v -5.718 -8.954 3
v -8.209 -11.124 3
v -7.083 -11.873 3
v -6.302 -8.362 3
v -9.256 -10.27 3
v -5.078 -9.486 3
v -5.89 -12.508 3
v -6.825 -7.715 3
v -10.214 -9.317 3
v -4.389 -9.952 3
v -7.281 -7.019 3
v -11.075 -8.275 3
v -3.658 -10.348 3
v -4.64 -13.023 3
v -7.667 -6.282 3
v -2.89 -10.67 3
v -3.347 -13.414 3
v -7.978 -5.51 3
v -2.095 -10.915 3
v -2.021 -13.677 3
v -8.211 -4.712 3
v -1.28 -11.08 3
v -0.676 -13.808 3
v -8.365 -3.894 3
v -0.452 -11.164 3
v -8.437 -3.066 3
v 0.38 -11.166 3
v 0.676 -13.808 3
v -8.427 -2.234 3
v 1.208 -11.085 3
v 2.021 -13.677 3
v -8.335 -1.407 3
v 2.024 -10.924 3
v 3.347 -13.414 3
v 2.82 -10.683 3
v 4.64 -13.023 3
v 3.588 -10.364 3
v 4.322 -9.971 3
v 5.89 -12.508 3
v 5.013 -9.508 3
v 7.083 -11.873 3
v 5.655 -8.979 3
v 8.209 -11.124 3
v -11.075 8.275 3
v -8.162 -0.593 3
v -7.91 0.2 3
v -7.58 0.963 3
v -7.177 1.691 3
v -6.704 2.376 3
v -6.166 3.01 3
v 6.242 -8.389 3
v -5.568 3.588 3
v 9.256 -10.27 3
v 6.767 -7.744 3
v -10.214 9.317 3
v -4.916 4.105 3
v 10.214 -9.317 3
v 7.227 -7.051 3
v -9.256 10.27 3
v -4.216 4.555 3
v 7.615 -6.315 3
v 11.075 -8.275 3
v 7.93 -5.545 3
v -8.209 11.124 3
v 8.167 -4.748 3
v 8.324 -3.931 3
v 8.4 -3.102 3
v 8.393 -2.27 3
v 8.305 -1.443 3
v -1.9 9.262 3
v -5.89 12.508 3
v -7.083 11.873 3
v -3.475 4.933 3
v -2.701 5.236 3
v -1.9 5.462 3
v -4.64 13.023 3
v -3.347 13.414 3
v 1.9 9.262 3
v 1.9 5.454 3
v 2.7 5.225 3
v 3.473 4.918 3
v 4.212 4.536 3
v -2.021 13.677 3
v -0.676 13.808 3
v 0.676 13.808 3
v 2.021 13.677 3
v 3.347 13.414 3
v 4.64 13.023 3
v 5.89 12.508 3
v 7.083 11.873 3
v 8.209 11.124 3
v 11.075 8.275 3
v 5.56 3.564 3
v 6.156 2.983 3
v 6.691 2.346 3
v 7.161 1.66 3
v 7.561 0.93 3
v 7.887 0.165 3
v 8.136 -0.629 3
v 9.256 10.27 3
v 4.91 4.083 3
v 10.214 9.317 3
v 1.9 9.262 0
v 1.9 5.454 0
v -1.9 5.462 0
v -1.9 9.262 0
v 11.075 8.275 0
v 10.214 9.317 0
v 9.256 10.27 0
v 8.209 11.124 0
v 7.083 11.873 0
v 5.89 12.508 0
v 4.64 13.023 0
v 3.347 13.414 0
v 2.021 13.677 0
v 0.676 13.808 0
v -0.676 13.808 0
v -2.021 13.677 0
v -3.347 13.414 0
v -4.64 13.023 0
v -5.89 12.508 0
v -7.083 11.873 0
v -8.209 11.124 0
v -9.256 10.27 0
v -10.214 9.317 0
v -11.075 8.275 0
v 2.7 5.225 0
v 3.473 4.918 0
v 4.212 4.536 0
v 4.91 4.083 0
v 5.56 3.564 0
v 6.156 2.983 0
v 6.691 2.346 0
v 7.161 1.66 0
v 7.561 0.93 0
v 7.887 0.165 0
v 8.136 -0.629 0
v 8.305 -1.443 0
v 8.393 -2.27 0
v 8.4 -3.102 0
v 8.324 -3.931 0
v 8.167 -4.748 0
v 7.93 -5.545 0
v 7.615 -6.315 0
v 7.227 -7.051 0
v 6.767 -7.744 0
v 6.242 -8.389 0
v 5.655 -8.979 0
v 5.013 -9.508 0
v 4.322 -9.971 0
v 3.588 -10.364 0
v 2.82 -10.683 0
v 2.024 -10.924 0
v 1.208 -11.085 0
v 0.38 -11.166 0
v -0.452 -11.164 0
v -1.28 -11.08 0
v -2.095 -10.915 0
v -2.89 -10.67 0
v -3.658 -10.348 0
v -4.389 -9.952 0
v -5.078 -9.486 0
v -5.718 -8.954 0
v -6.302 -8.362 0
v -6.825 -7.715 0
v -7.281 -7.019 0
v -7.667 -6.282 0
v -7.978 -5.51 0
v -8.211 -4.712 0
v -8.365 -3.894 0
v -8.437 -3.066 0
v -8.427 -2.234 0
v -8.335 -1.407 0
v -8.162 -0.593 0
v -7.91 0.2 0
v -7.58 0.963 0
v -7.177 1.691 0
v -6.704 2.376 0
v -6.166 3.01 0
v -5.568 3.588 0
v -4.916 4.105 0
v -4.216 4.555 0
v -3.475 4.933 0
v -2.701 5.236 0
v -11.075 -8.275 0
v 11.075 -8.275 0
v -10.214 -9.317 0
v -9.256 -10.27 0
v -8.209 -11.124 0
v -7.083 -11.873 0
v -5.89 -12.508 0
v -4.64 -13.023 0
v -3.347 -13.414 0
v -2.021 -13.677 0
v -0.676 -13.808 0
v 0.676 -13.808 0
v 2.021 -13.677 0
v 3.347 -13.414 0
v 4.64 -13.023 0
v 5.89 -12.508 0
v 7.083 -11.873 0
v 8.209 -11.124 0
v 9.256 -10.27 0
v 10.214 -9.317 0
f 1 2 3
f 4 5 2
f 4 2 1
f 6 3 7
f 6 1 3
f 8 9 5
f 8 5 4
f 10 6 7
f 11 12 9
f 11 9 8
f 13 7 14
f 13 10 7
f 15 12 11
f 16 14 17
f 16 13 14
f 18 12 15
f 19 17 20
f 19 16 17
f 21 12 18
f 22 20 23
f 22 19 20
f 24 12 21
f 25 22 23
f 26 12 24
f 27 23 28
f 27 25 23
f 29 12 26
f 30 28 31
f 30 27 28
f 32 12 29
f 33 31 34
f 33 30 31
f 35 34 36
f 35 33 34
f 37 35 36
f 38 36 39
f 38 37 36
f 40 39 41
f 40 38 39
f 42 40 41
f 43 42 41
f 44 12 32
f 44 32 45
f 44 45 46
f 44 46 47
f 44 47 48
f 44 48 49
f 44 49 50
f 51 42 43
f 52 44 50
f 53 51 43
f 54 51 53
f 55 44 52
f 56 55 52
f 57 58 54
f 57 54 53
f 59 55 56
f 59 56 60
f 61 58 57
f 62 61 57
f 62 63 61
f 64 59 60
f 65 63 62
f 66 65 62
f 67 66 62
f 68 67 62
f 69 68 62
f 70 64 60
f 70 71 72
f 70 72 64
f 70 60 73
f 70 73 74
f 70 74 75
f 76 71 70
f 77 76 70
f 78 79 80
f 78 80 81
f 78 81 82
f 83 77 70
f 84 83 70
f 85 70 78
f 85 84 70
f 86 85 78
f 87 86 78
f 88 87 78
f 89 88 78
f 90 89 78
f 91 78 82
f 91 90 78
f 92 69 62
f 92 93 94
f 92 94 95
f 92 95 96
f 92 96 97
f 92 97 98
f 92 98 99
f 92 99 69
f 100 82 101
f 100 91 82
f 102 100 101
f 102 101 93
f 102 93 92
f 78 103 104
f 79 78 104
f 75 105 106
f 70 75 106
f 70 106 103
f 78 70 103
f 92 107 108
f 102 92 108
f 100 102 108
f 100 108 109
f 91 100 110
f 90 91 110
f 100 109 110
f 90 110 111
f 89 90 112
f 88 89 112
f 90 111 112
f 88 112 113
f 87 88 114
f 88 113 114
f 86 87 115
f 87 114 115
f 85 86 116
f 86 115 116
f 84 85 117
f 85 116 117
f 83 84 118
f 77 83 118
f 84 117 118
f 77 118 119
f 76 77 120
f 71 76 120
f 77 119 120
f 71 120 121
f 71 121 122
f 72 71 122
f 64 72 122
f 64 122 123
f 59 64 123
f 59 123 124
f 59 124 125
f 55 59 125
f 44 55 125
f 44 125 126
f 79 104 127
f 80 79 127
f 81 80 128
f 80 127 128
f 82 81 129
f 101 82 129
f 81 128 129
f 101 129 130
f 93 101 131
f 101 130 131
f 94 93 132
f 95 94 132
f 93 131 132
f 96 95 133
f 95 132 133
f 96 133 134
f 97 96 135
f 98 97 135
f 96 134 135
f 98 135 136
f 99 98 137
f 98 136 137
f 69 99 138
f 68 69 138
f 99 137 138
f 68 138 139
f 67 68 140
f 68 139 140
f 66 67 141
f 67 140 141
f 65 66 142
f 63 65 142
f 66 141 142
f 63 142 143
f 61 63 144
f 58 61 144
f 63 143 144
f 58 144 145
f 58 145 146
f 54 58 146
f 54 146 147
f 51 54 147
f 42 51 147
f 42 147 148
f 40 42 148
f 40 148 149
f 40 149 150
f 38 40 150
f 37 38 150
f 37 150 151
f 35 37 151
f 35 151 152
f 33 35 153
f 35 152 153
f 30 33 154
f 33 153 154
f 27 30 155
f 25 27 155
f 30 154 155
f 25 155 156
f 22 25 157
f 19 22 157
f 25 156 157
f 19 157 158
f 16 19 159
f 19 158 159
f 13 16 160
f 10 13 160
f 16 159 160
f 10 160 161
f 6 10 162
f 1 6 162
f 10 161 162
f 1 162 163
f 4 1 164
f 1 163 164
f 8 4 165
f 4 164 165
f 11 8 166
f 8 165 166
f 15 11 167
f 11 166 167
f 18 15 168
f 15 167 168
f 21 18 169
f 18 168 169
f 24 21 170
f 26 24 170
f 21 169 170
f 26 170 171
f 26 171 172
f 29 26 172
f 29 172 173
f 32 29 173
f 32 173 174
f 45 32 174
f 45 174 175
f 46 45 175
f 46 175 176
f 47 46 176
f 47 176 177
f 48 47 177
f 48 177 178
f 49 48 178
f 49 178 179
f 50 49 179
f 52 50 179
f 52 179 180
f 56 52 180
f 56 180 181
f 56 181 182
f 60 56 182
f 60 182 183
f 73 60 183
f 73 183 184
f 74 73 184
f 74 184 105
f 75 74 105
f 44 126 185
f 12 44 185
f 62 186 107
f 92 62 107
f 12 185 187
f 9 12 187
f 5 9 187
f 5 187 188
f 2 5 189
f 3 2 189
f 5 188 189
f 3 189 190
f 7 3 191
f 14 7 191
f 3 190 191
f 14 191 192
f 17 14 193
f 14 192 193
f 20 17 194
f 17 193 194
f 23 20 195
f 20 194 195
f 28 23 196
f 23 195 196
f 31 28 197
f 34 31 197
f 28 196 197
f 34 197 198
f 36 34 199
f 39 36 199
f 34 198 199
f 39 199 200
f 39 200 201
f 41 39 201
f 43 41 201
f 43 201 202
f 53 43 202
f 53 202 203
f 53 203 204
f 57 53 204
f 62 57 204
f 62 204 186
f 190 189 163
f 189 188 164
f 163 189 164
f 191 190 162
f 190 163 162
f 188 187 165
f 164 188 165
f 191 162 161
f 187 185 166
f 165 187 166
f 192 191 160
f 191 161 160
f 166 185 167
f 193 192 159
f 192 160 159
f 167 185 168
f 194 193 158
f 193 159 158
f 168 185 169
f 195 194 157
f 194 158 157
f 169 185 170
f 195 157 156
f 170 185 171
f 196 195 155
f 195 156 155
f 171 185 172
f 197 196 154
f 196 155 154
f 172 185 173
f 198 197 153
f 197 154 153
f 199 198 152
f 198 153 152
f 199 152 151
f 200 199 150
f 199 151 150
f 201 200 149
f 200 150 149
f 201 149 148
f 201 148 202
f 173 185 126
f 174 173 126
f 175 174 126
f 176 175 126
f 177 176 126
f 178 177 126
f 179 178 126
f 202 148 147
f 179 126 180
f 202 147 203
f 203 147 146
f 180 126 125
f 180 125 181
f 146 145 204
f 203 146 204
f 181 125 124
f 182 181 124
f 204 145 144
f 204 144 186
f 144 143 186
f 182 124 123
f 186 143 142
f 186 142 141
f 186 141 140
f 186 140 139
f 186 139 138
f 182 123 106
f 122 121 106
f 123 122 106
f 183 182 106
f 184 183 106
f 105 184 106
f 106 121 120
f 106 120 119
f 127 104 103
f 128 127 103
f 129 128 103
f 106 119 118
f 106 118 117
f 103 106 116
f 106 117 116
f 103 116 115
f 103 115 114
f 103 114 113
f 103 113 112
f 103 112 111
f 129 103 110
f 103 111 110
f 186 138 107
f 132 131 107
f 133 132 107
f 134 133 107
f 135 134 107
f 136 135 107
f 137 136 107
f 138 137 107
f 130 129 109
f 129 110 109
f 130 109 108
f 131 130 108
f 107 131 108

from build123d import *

# Parameters (mm, degrees)
F2_DEPTH = 3


with BuildPart() as f2:
    # F1 (on Top) → F2 (new body)
    with BuildSketch(Plane.XY):
        with BuildLine():
            Line((-11.075, 8.274962), (-11.075, -8.274962))
            ThreePointArc((-11.075, -8.274962), (0, -13.825), (11.075, -8.274962))
            Line((11.075, -8.274962), (11.075, 8.274962))
            ThreePointArc((11.075, 8.274962), (0, 13.825), (-11.075, 8.274962))
        make_face()
        with BuildLine():
            ThreePointArc((1.9, 5.453852), (-0.036302, -11.174922), (-1.9, 5.462146))
            Line((-1.9, 5.462146), (-1.9, 9.262146))
            Line((-1.9, 9.262146), (1.9, 9.262146))
            Line((1.9, 9.262146), (1.9, 5.453852))
        make_face(mode=Mode.SUBTRACT)
    extrude(amount=F2_DEPTH)


solid = f2.part
